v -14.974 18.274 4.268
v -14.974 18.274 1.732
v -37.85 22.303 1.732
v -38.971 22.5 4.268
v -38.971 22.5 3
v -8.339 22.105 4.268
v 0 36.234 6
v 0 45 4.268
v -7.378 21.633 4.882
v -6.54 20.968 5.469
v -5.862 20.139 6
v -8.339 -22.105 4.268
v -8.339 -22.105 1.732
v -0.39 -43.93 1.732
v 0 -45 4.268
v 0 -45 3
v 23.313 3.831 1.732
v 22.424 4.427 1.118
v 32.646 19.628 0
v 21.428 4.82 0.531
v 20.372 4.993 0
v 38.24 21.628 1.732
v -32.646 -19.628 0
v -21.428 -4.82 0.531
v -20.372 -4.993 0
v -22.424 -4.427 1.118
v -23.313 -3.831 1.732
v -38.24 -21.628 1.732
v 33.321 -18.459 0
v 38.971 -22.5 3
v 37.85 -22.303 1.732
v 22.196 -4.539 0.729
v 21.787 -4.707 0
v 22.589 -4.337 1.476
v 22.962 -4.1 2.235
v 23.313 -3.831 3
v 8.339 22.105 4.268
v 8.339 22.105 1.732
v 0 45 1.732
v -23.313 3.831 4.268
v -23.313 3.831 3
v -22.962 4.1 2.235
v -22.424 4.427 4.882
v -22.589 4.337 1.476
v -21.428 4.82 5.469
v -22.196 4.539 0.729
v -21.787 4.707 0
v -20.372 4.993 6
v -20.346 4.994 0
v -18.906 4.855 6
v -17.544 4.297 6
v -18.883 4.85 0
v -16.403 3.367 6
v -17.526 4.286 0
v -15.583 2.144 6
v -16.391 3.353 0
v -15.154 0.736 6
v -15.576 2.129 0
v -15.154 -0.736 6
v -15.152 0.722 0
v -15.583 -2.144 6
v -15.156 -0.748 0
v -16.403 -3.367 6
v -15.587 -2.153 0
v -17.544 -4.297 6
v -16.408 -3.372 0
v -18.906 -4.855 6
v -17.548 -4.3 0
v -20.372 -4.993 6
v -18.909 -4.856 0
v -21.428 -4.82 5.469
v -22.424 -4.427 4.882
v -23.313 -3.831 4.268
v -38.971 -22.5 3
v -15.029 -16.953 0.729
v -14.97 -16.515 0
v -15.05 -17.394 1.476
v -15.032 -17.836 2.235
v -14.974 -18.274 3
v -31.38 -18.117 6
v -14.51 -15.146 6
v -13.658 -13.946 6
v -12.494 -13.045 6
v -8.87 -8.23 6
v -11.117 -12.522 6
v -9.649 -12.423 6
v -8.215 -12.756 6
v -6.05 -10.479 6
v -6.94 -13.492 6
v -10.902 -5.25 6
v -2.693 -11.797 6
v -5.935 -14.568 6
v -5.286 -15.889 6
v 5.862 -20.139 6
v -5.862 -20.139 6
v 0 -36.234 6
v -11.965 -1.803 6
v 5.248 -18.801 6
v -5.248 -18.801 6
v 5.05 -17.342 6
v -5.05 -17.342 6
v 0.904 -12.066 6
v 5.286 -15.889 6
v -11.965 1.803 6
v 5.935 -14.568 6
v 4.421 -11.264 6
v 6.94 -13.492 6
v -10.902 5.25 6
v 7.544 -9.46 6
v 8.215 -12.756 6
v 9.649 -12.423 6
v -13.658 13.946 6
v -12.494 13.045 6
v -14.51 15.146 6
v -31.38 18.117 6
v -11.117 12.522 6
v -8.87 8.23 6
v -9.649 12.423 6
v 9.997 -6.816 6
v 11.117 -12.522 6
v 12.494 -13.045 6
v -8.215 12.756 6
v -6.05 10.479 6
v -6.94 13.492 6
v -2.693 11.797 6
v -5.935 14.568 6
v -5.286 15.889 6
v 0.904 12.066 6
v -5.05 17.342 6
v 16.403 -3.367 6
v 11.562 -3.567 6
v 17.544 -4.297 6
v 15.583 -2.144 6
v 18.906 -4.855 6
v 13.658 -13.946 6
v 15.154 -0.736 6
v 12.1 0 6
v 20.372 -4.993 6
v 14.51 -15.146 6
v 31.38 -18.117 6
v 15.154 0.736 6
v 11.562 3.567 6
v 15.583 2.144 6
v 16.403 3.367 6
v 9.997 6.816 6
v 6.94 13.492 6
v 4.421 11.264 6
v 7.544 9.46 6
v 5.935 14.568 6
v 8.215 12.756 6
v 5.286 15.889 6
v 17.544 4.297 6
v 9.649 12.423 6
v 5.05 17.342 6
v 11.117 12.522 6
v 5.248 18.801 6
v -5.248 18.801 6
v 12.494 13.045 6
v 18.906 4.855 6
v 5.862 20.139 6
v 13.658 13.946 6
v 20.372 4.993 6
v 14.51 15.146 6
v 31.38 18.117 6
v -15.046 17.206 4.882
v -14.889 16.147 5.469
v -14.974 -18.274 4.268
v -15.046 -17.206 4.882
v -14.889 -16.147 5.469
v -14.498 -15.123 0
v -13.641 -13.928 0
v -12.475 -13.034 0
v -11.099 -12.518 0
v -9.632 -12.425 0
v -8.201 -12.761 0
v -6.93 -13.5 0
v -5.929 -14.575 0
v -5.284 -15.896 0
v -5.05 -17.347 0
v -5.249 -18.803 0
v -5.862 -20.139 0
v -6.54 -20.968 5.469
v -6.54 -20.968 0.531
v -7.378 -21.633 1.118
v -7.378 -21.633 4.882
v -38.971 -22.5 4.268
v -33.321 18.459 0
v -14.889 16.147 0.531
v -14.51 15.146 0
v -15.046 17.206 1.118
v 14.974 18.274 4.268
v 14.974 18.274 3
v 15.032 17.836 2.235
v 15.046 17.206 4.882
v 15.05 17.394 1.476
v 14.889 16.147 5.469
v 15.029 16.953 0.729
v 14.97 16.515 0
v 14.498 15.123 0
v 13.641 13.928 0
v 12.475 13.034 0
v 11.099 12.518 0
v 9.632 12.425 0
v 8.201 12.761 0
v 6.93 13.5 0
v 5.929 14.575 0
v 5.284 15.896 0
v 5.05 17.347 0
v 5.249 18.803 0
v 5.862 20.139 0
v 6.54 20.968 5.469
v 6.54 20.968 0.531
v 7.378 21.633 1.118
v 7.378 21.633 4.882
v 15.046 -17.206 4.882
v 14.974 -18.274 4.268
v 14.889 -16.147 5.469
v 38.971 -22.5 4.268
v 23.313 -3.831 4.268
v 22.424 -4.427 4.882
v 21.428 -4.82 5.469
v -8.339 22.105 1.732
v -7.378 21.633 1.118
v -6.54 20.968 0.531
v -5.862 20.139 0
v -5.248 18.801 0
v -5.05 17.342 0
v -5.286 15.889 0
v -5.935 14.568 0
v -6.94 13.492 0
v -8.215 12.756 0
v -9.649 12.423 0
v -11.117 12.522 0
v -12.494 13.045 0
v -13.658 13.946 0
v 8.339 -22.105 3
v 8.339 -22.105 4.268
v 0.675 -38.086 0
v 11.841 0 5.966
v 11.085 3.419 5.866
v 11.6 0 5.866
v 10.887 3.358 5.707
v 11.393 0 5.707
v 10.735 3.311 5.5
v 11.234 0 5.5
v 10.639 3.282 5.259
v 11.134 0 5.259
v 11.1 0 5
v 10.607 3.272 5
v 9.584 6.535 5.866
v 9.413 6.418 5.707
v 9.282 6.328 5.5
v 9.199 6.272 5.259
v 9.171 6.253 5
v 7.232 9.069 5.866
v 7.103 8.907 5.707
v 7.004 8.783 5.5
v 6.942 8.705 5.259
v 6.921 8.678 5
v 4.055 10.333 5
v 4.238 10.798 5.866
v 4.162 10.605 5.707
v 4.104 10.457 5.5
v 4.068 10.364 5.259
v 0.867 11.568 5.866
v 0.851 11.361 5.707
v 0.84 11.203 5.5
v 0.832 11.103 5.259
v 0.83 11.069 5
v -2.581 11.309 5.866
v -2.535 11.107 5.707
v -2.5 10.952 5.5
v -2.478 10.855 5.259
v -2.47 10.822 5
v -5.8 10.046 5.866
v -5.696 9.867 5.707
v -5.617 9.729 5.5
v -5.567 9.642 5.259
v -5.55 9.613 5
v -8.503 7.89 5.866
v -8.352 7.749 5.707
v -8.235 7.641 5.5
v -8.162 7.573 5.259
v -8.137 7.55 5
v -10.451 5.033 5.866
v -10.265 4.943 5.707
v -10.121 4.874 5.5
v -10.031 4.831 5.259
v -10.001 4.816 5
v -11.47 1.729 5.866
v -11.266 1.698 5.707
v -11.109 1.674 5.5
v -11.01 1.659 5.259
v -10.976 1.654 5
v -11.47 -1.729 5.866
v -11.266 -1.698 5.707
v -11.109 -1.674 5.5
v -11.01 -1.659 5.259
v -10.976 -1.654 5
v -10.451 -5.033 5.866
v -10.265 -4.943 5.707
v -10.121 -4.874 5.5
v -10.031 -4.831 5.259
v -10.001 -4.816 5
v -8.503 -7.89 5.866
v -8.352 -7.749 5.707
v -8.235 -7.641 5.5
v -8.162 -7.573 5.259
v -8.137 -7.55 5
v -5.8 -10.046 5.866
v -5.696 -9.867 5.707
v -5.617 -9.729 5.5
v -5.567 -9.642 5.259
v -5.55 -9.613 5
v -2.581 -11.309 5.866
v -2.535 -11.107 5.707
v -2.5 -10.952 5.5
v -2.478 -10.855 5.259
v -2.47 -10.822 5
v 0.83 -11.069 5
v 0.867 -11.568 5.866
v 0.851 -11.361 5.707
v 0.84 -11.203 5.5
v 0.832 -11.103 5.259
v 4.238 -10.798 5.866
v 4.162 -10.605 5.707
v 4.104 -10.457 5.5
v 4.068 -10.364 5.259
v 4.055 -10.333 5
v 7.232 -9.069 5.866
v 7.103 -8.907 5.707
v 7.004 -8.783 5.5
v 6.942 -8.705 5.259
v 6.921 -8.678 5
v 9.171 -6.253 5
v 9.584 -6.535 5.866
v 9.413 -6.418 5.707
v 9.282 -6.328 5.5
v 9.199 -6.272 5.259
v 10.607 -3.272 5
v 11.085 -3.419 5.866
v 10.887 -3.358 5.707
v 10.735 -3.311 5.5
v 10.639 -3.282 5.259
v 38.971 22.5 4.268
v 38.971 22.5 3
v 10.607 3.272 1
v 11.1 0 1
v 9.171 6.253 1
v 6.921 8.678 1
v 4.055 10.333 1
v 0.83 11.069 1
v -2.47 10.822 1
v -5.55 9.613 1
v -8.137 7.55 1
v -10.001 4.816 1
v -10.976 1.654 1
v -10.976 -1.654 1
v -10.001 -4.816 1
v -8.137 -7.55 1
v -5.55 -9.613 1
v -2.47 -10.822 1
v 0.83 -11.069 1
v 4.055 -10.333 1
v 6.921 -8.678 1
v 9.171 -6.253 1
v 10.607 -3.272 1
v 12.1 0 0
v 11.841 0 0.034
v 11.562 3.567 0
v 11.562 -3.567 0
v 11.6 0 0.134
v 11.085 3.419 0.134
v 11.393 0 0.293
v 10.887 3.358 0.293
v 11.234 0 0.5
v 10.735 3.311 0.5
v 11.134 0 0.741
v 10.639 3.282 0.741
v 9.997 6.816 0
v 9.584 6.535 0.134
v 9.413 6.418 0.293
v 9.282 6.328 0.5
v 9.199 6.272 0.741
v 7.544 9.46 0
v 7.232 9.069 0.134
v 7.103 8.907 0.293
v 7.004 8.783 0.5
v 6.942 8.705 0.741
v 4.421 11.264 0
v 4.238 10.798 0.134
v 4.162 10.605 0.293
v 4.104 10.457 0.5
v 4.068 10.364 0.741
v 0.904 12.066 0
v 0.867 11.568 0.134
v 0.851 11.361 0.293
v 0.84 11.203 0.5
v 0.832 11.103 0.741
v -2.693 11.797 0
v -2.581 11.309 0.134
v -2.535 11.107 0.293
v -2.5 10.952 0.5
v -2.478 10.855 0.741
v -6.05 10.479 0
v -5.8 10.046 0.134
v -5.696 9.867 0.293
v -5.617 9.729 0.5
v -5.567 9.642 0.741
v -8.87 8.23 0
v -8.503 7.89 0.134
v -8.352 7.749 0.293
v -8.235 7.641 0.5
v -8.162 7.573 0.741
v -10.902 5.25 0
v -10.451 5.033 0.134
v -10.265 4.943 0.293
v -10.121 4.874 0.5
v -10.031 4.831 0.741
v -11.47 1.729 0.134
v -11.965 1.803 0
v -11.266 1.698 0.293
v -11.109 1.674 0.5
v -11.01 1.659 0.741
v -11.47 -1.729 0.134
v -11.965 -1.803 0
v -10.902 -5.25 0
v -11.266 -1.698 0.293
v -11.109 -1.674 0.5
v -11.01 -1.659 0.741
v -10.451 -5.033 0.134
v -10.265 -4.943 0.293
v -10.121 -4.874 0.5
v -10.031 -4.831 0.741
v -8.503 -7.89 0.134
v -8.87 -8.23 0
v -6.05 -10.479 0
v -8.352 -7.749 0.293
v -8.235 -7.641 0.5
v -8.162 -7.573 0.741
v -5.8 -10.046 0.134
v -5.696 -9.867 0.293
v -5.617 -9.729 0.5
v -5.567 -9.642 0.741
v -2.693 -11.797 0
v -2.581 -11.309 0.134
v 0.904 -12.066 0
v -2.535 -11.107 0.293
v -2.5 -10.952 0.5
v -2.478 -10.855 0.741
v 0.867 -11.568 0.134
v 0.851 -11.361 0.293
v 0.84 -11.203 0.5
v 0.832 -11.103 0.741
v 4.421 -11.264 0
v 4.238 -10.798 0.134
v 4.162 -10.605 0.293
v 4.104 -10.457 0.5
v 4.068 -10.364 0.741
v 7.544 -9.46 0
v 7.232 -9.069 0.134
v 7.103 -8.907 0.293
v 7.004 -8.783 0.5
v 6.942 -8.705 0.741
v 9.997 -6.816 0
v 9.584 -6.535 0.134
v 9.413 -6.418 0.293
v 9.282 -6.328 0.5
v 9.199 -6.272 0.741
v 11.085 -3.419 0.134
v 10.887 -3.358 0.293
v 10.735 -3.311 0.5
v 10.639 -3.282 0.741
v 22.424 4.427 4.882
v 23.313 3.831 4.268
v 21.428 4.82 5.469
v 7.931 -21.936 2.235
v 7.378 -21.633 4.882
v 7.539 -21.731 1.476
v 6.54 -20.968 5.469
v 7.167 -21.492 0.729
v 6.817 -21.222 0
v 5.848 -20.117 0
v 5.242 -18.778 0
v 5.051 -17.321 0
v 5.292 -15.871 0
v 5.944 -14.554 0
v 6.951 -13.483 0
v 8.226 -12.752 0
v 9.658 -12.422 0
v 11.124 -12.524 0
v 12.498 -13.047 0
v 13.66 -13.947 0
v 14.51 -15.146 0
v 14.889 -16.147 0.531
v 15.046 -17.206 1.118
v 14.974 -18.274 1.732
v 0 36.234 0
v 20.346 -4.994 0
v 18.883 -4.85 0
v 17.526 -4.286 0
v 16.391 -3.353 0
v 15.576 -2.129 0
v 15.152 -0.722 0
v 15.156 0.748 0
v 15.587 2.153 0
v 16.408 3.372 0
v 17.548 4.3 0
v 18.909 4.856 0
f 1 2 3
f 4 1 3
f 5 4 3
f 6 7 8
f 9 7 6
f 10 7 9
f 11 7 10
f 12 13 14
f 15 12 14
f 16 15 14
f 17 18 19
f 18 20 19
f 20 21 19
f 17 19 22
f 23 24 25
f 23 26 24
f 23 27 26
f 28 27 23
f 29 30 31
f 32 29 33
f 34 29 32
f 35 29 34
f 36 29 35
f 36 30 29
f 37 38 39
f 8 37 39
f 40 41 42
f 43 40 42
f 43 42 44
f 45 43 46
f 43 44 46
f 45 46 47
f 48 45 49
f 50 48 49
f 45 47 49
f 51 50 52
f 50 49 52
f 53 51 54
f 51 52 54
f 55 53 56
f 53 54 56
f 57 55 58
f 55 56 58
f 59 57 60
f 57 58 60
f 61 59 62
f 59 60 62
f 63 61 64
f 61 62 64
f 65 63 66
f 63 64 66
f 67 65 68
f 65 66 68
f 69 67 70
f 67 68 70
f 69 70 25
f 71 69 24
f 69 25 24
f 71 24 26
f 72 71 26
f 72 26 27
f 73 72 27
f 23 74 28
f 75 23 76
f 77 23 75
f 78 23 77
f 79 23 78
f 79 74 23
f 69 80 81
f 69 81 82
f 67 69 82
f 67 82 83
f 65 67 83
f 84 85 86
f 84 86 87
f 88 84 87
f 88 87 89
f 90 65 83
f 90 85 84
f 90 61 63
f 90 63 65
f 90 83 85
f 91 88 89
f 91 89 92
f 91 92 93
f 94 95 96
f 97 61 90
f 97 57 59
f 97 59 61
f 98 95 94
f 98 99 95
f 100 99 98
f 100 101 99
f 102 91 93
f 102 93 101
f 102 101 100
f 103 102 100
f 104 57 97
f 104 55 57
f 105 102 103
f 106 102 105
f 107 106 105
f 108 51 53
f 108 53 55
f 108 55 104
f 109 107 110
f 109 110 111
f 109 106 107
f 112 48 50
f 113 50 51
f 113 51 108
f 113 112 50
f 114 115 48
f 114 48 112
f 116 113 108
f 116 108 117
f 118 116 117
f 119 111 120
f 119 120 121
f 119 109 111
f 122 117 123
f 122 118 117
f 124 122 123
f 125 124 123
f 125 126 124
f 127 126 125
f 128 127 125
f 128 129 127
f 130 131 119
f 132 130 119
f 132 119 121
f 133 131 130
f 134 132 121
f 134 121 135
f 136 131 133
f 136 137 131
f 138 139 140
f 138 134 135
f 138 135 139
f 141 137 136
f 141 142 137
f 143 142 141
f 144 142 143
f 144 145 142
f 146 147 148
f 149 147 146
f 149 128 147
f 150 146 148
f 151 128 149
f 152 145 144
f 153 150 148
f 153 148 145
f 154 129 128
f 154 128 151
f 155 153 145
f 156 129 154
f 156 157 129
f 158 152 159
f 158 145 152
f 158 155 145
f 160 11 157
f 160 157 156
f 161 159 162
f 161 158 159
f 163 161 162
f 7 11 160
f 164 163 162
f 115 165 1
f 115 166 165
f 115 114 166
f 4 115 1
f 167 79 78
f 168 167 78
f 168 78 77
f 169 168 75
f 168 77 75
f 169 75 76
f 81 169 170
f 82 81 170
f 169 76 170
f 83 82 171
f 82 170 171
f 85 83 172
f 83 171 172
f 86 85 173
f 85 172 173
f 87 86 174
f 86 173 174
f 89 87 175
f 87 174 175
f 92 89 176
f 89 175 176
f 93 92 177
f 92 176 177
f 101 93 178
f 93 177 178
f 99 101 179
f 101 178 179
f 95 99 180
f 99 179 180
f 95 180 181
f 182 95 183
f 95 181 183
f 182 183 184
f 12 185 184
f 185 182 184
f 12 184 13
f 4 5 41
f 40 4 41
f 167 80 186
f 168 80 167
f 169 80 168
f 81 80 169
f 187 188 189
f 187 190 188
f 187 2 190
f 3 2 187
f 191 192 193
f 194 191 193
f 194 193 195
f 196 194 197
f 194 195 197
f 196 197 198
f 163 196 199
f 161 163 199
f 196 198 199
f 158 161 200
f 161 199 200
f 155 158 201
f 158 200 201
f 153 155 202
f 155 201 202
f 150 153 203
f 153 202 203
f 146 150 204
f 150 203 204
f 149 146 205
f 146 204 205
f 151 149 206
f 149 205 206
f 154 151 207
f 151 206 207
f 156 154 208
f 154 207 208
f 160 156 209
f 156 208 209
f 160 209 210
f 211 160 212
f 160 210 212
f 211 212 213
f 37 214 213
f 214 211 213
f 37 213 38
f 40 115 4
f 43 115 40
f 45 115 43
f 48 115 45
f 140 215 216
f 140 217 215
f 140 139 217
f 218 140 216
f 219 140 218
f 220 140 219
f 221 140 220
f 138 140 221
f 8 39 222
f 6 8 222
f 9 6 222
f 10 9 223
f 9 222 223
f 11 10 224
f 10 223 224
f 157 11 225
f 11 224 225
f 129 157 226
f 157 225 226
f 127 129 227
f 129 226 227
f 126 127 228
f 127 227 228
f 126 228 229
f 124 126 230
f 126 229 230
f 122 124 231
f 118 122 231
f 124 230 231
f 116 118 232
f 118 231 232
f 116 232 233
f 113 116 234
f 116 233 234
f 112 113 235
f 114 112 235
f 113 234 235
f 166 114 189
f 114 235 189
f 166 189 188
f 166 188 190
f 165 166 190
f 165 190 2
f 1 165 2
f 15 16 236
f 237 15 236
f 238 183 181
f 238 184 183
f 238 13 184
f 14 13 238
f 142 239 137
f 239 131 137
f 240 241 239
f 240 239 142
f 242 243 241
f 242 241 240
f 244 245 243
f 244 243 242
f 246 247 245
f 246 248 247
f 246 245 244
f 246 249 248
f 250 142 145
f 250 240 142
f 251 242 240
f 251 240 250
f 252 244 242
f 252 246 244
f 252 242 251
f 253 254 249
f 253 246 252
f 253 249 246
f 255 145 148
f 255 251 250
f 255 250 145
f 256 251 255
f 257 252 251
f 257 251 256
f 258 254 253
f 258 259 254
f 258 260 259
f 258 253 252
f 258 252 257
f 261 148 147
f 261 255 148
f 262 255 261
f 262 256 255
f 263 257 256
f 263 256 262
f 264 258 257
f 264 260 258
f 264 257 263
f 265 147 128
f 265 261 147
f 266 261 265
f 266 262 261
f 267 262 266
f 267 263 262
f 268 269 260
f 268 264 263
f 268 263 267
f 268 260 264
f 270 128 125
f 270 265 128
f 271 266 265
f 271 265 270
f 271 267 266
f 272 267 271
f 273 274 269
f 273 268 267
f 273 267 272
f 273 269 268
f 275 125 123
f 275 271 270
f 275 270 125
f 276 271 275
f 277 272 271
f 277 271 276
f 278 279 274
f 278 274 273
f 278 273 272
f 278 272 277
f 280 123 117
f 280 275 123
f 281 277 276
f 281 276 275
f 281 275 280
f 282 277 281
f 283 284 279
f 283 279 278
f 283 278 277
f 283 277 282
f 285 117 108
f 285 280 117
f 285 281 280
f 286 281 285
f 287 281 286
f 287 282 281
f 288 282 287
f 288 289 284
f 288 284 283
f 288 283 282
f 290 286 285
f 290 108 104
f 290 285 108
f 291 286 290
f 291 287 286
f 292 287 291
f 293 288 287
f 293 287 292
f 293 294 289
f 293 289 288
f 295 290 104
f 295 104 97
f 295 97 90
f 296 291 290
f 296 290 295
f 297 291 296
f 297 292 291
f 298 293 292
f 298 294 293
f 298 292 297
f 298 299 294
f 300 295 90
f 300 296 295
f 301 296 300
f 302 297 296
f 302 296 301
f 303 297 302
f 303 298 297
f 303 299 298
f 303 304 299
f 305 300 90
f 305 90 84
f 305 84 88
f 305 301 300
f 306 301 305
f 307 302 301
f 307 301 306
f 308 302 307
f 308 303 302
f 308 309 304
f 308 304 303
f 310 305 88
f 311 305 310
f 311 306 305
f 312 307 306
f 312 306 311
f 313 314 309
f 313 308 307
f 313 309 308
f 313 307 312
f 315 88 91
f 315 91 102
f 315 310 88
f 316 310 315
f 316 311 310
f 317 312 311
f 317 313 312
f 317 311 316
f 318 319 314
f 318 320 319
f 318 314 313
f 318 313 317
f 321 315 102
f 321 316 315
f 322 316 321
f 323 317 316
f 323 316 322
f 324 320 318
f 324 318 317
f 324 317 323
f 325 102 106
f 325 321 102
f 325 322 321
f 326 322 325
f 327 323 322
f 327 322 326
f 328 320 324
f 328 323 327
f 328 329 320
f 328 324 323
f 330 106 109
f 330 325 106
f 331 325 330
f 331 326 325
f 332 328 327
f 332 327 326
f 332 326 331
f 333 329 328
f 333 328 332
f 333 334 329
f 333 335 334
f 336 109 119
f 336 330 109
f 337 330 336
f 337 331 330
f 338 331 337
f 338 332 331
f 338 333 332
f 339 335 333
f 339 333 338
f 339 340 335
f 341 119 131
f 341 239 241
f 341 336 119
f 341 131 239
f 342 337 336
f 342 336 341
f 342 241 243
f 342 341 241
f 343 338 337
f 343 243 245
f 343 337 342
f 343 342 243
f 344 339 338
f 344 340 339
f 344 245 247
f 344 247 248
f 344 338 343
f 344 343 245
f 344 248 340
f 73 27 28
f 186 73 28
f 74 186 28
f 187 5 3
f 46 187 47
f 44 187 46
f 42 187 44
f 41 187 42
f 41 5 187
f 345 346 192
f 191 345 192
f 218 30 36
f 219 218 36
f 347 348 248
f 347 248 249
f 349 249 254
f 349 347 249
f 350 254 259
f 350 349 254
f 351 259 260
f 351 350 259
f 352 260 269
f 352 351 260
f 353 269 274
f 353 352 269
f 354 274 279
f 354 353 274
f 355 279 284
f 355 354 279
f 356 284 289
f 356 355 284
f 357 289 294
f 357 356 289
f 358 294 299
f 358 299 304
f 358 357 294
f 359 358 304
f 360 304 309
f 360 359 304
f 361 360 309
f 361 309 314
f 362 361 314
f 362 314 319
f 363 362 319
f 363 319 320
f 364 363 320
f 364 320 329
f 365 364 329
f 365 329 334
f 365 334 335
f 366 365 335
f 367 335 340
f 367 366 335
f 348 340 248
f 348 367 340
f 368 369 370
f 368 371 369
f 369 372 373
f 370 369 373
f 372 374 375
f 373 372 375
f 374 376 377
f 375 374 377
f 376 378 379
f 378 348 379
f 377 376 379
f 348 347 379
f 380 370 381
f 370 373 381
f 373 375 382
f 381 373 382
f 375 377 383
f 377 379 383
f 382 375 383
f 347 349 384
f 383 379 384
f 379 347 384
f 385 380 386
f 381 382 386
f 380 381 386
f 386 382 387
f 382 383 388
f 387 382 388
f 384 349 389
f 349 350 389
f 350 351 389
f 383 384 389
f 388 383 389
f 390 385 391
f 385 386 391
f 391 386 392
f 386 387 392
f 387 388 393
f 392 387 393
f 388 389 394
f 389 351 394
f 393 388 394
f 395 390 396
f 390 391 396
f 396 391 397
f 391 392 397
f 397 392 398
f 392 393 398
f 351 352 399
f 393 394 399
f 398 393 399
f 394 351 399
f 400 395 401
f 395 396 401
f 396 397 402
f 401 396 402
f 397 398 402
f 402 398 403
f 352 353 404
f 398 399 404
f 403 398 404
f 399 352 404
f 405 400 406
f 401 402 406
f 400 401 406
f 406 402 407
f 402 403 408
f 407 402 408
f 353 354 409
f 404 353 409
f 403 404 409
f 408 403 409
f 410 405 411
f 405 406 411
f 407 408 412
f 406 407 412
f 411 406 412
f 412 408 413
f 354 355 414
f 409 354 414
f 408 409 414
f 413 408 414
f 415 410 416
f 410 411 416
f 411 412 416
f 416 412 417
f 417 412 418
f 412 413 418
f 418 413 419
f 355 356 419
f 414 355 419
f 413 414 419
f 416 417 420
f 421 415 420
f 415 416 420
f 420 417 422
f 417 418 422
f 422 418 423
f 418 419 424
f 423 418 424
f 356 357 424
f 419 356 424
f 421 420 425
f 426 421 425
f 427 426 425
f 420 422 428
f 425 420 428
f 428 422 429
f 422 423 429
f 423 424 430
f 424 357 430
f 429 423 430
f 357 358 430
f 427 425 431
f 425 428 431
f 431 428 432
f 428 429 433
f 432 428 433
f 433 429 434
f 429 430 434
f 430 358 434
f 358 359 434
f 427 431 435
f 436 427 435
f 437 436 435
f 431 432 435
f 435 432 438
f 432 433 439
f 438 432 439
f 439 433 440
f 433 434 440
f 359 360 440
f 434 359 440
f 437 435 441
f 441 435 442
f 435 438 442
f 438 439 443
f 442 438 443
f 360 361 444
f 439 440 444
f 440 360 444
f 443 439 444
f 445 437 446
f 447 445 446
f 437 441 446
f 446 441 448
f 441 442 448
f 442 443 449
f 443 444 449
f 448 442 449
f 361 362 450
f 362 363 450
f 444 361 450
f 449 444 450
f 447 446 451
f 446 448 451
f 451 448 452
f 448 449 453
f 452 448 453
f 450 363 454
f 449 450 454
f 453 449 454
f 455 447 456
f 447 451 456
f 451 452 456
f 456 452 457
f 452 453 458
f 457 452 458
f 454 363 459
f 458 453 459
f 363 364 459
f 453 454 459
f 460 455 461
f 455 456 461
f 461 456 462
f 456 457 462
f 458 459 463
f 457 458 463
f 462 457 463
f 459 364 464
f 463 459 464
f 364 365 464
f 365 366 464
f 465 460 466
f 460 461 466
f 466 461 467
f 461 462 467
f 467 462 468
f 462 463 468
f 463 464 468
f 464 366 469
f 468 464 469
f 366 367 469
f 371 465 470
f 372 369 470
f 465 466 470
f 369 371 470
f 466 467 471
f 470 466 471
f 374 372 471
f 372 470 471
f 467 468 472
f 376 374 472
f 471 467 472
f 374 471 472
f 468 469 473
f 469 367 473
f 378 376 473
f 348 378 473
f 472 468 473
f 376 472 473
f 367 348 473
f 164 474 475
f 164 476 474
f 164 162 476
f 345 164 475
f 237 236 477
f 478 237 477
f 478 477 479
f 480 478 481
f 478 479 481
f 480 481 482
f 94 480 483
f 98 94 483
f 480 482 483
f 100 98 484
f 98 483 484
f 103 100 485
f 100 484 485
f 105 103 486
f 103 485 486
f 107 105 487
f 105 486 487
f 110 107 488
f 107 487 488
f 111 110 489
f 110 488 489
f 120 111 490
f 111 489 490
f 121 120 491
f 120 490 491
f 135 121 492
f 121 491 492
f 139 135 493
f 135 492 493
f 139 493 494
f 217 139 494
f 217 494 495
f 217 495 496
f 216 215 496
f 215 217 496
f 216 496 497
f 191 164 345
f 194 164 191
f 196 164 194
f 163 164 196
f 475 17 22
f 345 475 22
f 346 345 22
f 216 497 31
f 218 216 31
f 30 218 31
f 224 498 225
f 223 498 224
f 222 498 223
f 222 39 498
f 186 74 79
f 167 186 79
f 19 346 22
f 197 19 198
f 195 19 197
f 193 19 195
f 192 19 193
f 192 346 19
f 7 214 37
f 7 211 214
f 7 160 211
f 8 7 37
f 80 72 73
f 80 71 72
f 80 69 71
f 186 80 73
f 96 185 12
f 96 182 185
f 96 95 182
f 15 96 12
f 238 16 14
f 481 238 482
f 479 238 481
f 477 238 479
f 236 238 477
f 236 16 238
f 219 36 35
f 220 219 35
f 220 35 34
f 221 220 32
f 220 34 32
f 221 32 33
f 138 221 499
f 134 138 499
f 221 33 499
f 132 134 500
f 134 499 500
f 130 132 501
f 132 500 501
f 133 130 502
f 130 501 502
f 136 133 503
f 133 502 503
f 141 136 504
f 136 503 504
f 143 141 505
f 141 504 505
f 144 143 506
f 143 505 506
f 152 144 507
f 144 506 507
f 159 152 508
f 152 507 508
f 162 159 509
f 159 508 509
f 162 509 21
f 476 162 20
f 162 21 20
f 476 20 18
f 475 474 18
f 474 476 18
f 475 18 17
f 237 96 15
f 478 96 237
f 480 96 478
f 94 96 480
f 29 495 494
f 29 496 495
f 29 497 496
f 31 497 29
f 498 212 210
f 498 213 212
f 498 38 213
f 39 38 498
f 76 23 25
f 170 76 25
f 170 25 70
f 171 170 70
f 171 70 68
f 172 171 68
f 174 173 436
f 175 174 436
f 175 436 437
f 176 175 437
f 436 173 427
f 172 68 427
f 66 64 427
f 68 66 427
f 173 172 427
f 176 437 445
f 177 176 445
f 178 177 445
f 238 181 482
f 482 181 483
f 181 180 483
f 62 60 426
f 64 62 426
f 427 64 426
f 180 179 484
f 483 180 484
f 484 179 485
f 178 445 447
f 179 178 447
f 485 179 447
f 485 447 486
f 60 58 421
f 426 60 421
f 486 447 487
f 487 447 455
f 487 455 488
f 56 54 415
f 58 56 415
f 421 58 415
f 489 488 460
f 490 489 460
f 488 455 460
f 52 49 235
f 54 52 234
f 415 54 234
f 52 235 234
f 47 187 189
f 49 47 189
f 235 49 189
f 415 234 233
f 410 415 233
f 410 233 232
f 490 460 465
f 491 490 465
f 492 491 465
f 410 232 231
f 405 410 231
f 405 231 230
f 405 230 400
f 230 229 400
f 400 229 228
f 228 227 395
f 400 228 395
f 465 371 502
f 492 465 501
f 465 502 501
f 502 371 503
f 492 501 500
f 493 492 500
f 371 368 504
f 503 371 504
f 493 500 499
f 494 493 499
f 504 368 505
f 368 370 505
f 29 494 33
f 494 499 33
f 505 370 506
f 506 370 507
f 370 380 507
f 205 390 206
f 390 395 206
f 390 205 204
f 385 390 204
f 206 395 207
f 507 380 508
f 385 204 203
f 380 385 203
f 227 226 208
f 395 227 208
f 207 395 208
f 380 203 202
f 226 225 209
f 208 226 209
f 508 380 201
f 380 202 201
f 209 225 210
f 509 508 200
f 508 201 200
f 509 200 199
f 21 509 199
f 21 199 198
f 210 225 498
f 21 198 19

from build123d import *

# Parameters (mm, degrees)
F0_R         = 11.1
F1_DEPTH     = 6
F2_C1_SIZE2  = 3
F2_C1_SIZE   = 1.7320508076
F2_C2_SIZE2  = 3
F2_C2_SIZE   = 1.7320508076
F2_C3_SIZE2  = 3
F2_C3_SIZE   = 1.7320508076
F2_C4_SIZE2  = 3
F2_C4_SIZE   = 1.7320508076
F2_C5_SIZE2  = 1.7320508076
F2_C5_SIZE   = 3
F2_C6_SIZE2  = 3
F2_C6_SIZE   = 1.7320508076
F2_C7_SIZE2  = 1.7320508076
F2_C7_SIZE   = 3
F2_C8_SIZE2  = 3
F2_C8_SIZE   = 1.7320508076
F2_C9_SIZE2  = 1.7320508076
F2_C9_SIZE   = 3
F2_C10_SIZE2 = 3
F2_C10_SIZE  = 1.7320508076
F2_C11_SIZE2 = 3
F2_C11_SIZE  = 1.7320508076
F2_C12_SIZE2 = 3
F2_C12_SIZE  = 1.7320508076
F2_C13_SIZE2 = 1.7320508076
F2_C13_SIZE  = 3
F2_C14_SIZE2 = 3
F2_C14_SIZE  = 1.7320508076
F2_C15_SIZE2 = 3
F2_C15_SIZE  = 1.7320508076
F2_C16_SIZE2 = 3
F2_C16_SIZE  = 1.7320508076
F2_C17_SIZE2 = 1.7320508076
F2_C17_SIZE  = 3
F2_C18_SIZE2 = 3
F2_C18_SIZE  = 1.7320508076
F2_C19_SIZE2 = 3
F2_C19_SIZE  = 1.7320508076
F2_C20_SIZE2 = 3
F2_C20_SIZE  = 1.7320508076
F2_C21_SIZE2 = 1.7320508076
F2_C21_SIZE  = 3
F2_C22_SIZE2 = 3
F2_C22_SIZE  = 1.7320508076
F2_C23_SIZE2 = 3
F2_C23_SIZE  = 1.7320508076
F2_C24_SIZE2 = 3
F2_C24_SIZE  = 1.7320508076
F3_R         = 1


with BuildPart() as f1:
    # F0 (on Top) → F1 (new body)
    with BuildSketch(Plane.XY):
        with BuildLine():
            Line((8.3388454559, 22.1051900243), (0, 45))
            Line((0, 45), (-8.3388454559, 22.1051900243))
            ThreePointArc((-8.3388454559, 22.1051900243), (-7.55, 13.0769835971), (-14.9742333886, 18.2742470152))
            Line((-14.9742333886, 18.2742470152), (-38.9711431703, 22.5))
            Line((-38.9711431703, 22.5), (-23.3130788445, 3.8309430091))
            ThreePointArc((-23.3130788445, 3.8309430091), (-15.1, 0), (-23.3130788445, -3.8309430091))
            Line((-23.3130788445, -3.8309430091), (-38.9711431703, -22.5))
            Line((-38.9711431703, -22.5), (-14.9742333886, -18.2742470152))
            ThreePointArc((-14.9742333886, -18.2742470152), (-7.55, -13.0769835971), (-8.3388454559, -22.1051900243))
            Line((-8.3388454559, -22.1051900243), (0, -45))
            Line((0, -45), (8.3388454559, -22.1051900243))
            ThreePointArc((8.3388454559, -22.1051900243), (7.55, -13.0769835971), (14.9742333886, -18.2742470152))
            Line((14.9742333886, -18.2742470152), (38.9711431703, -22.5))
            Line((38.9711431703, -22.5), (23.3130788445, -3.8309430091))
            ThreePointArc((23.3130788445, -3.8309430091), (15.1, 0), (23.3130788445, 3.8309430091))
            Line((23.3130788445, 3.8309430091), (38.9711431703, 22.5))
            Line((38.9711431703, 22.5), (14.9742333886, 18.2742470152))
            ThreePointArc((14.9742333886, 18.2742470152), (7.55, 13.0769835971), (8.3388454559, 22.1051900243))
        make_face()
        Circle(F0_R, mode=Mode.SUBTRACT)
    extrude(amount=F1_DEPTH)

    # F2: chamfer of 3 x 1.7320508076 on 24 edges, made by hand

    # F2_c1
    f2_c1_edges = [f1.edges().sort_by_distance(p)[0] for p in [
        (31.1421110074, 13.1654715045, 0),
    ]]
    f2_c1_side = f1.faces().sort_by_distance((31.1421110074, 13.1654715045, 0.0346410162))[0]
    chamfer(f2_c1_edges, length=F2_C1_SIZE, length2=F2_C1_SIZE2, reference=f2_c1_side)

    # F2_c2
    f2_c2_edges = [f1.edges().sort_by_distance(p)[0] for p in [
        (31.1421110074, 13.1654715045, 6),
    ]]
    f2_c2_side = f1.faces().sort_by_distance((31.1421110074, 13.1654715045, 5.9653589838))[0]
    chamfer(f2_c2_edges, length=F2_C2_SIZE, length2=F2_C2_SIZE2, reference=f2_c2_side)

    # F2_c3
    f2_c3_edges = [f1.edges().sort_by_distance(p)[0] for p in [
        (24.6756919125, 19.9826322901, 0),
    ]]
    f2_c3_side = f1.faces().sort_by_distance((24.6816996097, 19.9485162005, 0))[0]
    chamfer(f2_c3_edges, length=F2_C3_SIZE, length2=F2_C3_SIZE2, reference=f2_c3_side)

    # F2_c4
    f2_c4_edges = [f1.edges().sort_by_distance(p)[0] for p in [
        (24.6756919125, 19.9826322901, 6),
    ]]
    f2_c4_side = f1.faces().sort_by_distance((24.6756919125, 19.9826322901, 5.9653589838))[0]
    chamfer(f2_c4_edges, length=F2_C4_SIZE, length2=F2_C4_SIZE2, reference=f2_c4_side)

    # F2_c5
    f2_c5_edges = [f1.edges().sort_by_distance(p)[0] for p in [
        (4.169422728, 33.5525950122, 0),
    ]]
    f2_c5_side = f1.faces().sort_by_distance((4.136873479, 33.5407397857, 0))[0]
    chamfer(f2_c5_edges, length=F2_C5_SIZE, length2=F2_C5_SIZE2, reference=f2_c5_side)

    # F2_c6
    f2_c6_edges = [f1.edges().sort_by_distance(p)[0] for p in [
        (4.169422728, 33.5525950122, 6),
    ]]
    f2_c6_side = f1.faces().sort_by_distance((4.169422728, 33.5525950122, 5.9653589838))[0]
    chamfer(f2_c6_edges, length=F2_C6_SIZE, length2=F2_C6_SIZE2, reference=f2_c6_side)

    # F2_c7
    f2_c7_edges = [f1.edges().sort_by_distance(p)[0] for p in [
        (-4.9676212415, 31.3610921973, 0),
    ]]
    f2_c7_side = f1.faces().sort_by_distance((-4.9350719925, 31.3492369708, 0))[0]
    chamfer(f2_c7_edges, length=F2_C7_SIZE, length2=F2_C7_SIZE2, reference=f2_c7_side)

    # F2_c8
    f2_c8_edges = [f1.edges().sort_by_distance(p)[0] for p in [
        (-4.9676212415, 31.3610921973, 6),
    ]]
    f2_c8_side = f1.faces().sort_by_distance((-4.9676212415, 31.3610921973, 5.9653589838))[0]
    chamfer(f2_c8_edges, length=F2_C8_SIZE, length2=F2_C8_SIZE2, reference=f2_c8_side)

    # F2_c9
    f2_c9_edges = [f1.edges().sort_by_distance(p)[0] for p in [
        (-26.9726882794, 20.3871235076, 0),
    ]]
    f2_c9_side = f1.faces().sort_by_distance((-26.9786959766, 20.353007418, 0))[0]
    chamfer(f2_c9_edges, length=F2_C9_SIZE, length2=F2_C9_SIZE2, reference=f2_c9_side)

    # F2_c10
    f2_c10_edges = [f1.edges().sort_by_distance(p)[0] for p in [
        (-26.9726882794, 20.3871235076, 6),
    ]]
    f2_c10_side = f1.faces().sort_by_distance((-26.9726882794, 20.3871235076, 5.9653589838))[0]
    chamfer(f2_c10_edges, length=F2_C10_SIZE, length2=F2_C10_SIZE2, reference=f2_c10_side)

    # F2_c11
    f2_c11_edges = [f1.edges().sort_by_distance(p)[0] for p in [
        (-29.643313154, 11.3784599071, 0),
    ]]
    f2_c11_side = f1.faces().sort_by_distance((-29.6167716023, 11.4007207704, 0))[0]
    chamfer(f2_c11_edges, length=F2_C11_SIZE, length2=F2_C11_SIZE2, reference=f2_c11_side)

    # F2_c12
    f2_c12_edges = [f1.edges().sort_by_distance(p)[0] for p in [
        (-29.643313154, 11.3784599071, 6),
    ]]
    f2_c12_side = f1.faces().sort_by_distance((-29.643313154, 11.3784599071, 5.9653589838))[0]
    chamfer(f2_c12_edges, length=F2_C12_SIZE, length2=F2_C12_SIZE2, reference=f2_c12_side)

    # F2_c13
    f2_c13_edges = [f1.edges().sort_by_distance(p)[0] for p in [
        (-31.1421110074, -13.1654715045, 0),
    ]]
    f2_c13_side = f1.faces().sort_by_distance((-31.1155694557, -13.1877323678, 0))[0]
    chamfer(f2_c13_edges, length=F2_C13_SIZE, length2=F2_C13_SIZE2, reference=f2_c13_side)

    # F2_c14
    f2_c14_edges = [f1.edges().sort_by_distance(p)[0] for p in [
        (-31.1421110074, -13.1654715045, 6),
    ]]
    f2_c14_side = f1.faces().sort_by_distance((-31.1421110074, -13.1654715045, 5.9653589838))[0]
    chamfer(f2_c14_edges, length=F2_C14_SIZE, length2=F2_C14_SIZE2, reference=f2_c14_side)

    # F2_c15
    f2_c15_edges = [f1.edges().sort_by_distance(p)[0] for p in [
        (-24.6756919125, -19.9826322901, 0),
    ]]
    f2_c15_side = f1.faces().sort_by_distance((-24.6816996097, -19.9485162005, 0))[0]
    chamfer(f2_c15_edges, length=F2_C15_SIZE, length2=F2_C15_SIZE2, reference=f2_c15_side)

    # F2_c16
    f2_c16_edges = [f1.edges().sort_by_distance(p)[0] for p in [
        (-24.6756919125, -19.9826322901, 6),
    ]]
    f2_c16_side = f1.faces().sort_by_distance((-24.6756919125, -19.9826322901, 5.9653589838))[0]
    chamfer(f2_c16_edges, length=F2_C16_SIZE, length2=F2_C16_SIZE2, reference=f2_c16_side)

    # F2_c17
    f2_c17_edges = [f1.edges().sort_by_distance(p)[0] for p in [
        (-4.169422728, -33.5525950122, 0),
    ]]
    f2_c17_side = f1.faces().sort_by_distance((-4.136873479, -33.5407397857, 0))[0]
    chamfer(f2_c17_edges, length=F2_C17_SIZE, length2=F2_C17_SIZE2, reference=f2_c17_side)

    # F2_c18
    f2_c18_edges = [f1.edges().sort_by_distance(p)[0] for p in [
        (-4.169422728, -33.5525950122, 6),
    ]]
    f2_c18_side = f1.faces().sort_by_distance((-4.169422728, -33.5525950122, 5.9653589838))[0]
    chamfer(f2_c18_edges, length=F2_C18_SIZE, length2=F2_C18_SIZE2, reference=f2_c18_side)

    # F2_c19
    f2_c19_edges = [f1.edges().sort_by_distance(p)[0] for p in [
        (4.9676212415, -31.3610921973, 0),
    ]]
    f2_c19_side = f1.faces().sort_by_distance((4.9350719925, -31.3492369708, 0))[0]
    chamfer(f2_c19_edges, length=F2_C19_SIZE, length2=F2_C19_SIZE2, reference=f2_c19_side)

    # F2_c20
    f2_c20_edges = [f1.edges().sort_by_distance(p)[0] for p in [
        (4.9676212415, -31.3610921973, 6),
    ]]
    f2_c20_side = f1.faces().sort_by_distance((4.9676212415, -31.3610921973, 5.9653589838))[0]
    chamfer(f2_c20_edges, length=F2_C20_SIZE, length2=F2_C20_SIZE2, reference=f2_c20_side)

    # F2_c21
    f2_c21_edges = [f1.edges().sort_by_distance(p)[0] for p in [
        (26.9726882794, -20.3871235076, 0),
    ]]
    f2_c21_side = f1.faces().sort_by_distance((26.9786959766, -20.353007418, 0))[0]
    chamfer(f2_c21_edges, length=F2_C21_SIZE, length2=F2_C21_SIZE2, reference=f2_c21_side)

    # F2_c22
    f2_c22_edges = [f1.edges().sort_by_distance(p)[0] for p in [
        (26.9726882794, -20.3871235076, 6),
    ]]
    f2_c22_side = f1.faces().sort_by_distance((26.9726882794, -20.3871235076, 5.9653589838))[0]
    chamfer(f2_c22_edges, length=F2_C22_SIZE, length2=F2_C22_SIZE2, reference=f2_c22_side)

    # F2_c23
    f2_c23_edges = [f1.edges().sort_by_distance(p)[0] for p in [
        (29.643313154, -11.3784599071, 0),
    ]]
    f2_c23_side = f1.faces().sort_by_distance((29.6167716023, -11.4007207704, 0))[0]
    chamfer(f2_c23_edges, length=F2_C23_SIZE, length2=F2_C23_SIZE2, reference=f2_c23_side)

    # F2_c24
    f2_c24_edges = [f1.edges().sort_by_distance(p)[0] for p in [
        (29.643313154, -11.3784599071, 6),
    ]]
    f2_c24_side = f1.faces().sort_by_distance((29.643313154, -11.3784599071, 5.9653589838))[0]
    chamfer(f2_c24_edges, length=F2_C24_SIZE, length2=F2_C24_SIZE2, reference=f2_c24_side)

    # F3
    f3_edges = [f1.edges().sort_by_distance(p)[0] for p in [
        (-11.1, 0, 0),
        (-11.1, 0, 6),
    ]]
    fillet(f3_edges, radius=F3_R)


solid = f1.part
